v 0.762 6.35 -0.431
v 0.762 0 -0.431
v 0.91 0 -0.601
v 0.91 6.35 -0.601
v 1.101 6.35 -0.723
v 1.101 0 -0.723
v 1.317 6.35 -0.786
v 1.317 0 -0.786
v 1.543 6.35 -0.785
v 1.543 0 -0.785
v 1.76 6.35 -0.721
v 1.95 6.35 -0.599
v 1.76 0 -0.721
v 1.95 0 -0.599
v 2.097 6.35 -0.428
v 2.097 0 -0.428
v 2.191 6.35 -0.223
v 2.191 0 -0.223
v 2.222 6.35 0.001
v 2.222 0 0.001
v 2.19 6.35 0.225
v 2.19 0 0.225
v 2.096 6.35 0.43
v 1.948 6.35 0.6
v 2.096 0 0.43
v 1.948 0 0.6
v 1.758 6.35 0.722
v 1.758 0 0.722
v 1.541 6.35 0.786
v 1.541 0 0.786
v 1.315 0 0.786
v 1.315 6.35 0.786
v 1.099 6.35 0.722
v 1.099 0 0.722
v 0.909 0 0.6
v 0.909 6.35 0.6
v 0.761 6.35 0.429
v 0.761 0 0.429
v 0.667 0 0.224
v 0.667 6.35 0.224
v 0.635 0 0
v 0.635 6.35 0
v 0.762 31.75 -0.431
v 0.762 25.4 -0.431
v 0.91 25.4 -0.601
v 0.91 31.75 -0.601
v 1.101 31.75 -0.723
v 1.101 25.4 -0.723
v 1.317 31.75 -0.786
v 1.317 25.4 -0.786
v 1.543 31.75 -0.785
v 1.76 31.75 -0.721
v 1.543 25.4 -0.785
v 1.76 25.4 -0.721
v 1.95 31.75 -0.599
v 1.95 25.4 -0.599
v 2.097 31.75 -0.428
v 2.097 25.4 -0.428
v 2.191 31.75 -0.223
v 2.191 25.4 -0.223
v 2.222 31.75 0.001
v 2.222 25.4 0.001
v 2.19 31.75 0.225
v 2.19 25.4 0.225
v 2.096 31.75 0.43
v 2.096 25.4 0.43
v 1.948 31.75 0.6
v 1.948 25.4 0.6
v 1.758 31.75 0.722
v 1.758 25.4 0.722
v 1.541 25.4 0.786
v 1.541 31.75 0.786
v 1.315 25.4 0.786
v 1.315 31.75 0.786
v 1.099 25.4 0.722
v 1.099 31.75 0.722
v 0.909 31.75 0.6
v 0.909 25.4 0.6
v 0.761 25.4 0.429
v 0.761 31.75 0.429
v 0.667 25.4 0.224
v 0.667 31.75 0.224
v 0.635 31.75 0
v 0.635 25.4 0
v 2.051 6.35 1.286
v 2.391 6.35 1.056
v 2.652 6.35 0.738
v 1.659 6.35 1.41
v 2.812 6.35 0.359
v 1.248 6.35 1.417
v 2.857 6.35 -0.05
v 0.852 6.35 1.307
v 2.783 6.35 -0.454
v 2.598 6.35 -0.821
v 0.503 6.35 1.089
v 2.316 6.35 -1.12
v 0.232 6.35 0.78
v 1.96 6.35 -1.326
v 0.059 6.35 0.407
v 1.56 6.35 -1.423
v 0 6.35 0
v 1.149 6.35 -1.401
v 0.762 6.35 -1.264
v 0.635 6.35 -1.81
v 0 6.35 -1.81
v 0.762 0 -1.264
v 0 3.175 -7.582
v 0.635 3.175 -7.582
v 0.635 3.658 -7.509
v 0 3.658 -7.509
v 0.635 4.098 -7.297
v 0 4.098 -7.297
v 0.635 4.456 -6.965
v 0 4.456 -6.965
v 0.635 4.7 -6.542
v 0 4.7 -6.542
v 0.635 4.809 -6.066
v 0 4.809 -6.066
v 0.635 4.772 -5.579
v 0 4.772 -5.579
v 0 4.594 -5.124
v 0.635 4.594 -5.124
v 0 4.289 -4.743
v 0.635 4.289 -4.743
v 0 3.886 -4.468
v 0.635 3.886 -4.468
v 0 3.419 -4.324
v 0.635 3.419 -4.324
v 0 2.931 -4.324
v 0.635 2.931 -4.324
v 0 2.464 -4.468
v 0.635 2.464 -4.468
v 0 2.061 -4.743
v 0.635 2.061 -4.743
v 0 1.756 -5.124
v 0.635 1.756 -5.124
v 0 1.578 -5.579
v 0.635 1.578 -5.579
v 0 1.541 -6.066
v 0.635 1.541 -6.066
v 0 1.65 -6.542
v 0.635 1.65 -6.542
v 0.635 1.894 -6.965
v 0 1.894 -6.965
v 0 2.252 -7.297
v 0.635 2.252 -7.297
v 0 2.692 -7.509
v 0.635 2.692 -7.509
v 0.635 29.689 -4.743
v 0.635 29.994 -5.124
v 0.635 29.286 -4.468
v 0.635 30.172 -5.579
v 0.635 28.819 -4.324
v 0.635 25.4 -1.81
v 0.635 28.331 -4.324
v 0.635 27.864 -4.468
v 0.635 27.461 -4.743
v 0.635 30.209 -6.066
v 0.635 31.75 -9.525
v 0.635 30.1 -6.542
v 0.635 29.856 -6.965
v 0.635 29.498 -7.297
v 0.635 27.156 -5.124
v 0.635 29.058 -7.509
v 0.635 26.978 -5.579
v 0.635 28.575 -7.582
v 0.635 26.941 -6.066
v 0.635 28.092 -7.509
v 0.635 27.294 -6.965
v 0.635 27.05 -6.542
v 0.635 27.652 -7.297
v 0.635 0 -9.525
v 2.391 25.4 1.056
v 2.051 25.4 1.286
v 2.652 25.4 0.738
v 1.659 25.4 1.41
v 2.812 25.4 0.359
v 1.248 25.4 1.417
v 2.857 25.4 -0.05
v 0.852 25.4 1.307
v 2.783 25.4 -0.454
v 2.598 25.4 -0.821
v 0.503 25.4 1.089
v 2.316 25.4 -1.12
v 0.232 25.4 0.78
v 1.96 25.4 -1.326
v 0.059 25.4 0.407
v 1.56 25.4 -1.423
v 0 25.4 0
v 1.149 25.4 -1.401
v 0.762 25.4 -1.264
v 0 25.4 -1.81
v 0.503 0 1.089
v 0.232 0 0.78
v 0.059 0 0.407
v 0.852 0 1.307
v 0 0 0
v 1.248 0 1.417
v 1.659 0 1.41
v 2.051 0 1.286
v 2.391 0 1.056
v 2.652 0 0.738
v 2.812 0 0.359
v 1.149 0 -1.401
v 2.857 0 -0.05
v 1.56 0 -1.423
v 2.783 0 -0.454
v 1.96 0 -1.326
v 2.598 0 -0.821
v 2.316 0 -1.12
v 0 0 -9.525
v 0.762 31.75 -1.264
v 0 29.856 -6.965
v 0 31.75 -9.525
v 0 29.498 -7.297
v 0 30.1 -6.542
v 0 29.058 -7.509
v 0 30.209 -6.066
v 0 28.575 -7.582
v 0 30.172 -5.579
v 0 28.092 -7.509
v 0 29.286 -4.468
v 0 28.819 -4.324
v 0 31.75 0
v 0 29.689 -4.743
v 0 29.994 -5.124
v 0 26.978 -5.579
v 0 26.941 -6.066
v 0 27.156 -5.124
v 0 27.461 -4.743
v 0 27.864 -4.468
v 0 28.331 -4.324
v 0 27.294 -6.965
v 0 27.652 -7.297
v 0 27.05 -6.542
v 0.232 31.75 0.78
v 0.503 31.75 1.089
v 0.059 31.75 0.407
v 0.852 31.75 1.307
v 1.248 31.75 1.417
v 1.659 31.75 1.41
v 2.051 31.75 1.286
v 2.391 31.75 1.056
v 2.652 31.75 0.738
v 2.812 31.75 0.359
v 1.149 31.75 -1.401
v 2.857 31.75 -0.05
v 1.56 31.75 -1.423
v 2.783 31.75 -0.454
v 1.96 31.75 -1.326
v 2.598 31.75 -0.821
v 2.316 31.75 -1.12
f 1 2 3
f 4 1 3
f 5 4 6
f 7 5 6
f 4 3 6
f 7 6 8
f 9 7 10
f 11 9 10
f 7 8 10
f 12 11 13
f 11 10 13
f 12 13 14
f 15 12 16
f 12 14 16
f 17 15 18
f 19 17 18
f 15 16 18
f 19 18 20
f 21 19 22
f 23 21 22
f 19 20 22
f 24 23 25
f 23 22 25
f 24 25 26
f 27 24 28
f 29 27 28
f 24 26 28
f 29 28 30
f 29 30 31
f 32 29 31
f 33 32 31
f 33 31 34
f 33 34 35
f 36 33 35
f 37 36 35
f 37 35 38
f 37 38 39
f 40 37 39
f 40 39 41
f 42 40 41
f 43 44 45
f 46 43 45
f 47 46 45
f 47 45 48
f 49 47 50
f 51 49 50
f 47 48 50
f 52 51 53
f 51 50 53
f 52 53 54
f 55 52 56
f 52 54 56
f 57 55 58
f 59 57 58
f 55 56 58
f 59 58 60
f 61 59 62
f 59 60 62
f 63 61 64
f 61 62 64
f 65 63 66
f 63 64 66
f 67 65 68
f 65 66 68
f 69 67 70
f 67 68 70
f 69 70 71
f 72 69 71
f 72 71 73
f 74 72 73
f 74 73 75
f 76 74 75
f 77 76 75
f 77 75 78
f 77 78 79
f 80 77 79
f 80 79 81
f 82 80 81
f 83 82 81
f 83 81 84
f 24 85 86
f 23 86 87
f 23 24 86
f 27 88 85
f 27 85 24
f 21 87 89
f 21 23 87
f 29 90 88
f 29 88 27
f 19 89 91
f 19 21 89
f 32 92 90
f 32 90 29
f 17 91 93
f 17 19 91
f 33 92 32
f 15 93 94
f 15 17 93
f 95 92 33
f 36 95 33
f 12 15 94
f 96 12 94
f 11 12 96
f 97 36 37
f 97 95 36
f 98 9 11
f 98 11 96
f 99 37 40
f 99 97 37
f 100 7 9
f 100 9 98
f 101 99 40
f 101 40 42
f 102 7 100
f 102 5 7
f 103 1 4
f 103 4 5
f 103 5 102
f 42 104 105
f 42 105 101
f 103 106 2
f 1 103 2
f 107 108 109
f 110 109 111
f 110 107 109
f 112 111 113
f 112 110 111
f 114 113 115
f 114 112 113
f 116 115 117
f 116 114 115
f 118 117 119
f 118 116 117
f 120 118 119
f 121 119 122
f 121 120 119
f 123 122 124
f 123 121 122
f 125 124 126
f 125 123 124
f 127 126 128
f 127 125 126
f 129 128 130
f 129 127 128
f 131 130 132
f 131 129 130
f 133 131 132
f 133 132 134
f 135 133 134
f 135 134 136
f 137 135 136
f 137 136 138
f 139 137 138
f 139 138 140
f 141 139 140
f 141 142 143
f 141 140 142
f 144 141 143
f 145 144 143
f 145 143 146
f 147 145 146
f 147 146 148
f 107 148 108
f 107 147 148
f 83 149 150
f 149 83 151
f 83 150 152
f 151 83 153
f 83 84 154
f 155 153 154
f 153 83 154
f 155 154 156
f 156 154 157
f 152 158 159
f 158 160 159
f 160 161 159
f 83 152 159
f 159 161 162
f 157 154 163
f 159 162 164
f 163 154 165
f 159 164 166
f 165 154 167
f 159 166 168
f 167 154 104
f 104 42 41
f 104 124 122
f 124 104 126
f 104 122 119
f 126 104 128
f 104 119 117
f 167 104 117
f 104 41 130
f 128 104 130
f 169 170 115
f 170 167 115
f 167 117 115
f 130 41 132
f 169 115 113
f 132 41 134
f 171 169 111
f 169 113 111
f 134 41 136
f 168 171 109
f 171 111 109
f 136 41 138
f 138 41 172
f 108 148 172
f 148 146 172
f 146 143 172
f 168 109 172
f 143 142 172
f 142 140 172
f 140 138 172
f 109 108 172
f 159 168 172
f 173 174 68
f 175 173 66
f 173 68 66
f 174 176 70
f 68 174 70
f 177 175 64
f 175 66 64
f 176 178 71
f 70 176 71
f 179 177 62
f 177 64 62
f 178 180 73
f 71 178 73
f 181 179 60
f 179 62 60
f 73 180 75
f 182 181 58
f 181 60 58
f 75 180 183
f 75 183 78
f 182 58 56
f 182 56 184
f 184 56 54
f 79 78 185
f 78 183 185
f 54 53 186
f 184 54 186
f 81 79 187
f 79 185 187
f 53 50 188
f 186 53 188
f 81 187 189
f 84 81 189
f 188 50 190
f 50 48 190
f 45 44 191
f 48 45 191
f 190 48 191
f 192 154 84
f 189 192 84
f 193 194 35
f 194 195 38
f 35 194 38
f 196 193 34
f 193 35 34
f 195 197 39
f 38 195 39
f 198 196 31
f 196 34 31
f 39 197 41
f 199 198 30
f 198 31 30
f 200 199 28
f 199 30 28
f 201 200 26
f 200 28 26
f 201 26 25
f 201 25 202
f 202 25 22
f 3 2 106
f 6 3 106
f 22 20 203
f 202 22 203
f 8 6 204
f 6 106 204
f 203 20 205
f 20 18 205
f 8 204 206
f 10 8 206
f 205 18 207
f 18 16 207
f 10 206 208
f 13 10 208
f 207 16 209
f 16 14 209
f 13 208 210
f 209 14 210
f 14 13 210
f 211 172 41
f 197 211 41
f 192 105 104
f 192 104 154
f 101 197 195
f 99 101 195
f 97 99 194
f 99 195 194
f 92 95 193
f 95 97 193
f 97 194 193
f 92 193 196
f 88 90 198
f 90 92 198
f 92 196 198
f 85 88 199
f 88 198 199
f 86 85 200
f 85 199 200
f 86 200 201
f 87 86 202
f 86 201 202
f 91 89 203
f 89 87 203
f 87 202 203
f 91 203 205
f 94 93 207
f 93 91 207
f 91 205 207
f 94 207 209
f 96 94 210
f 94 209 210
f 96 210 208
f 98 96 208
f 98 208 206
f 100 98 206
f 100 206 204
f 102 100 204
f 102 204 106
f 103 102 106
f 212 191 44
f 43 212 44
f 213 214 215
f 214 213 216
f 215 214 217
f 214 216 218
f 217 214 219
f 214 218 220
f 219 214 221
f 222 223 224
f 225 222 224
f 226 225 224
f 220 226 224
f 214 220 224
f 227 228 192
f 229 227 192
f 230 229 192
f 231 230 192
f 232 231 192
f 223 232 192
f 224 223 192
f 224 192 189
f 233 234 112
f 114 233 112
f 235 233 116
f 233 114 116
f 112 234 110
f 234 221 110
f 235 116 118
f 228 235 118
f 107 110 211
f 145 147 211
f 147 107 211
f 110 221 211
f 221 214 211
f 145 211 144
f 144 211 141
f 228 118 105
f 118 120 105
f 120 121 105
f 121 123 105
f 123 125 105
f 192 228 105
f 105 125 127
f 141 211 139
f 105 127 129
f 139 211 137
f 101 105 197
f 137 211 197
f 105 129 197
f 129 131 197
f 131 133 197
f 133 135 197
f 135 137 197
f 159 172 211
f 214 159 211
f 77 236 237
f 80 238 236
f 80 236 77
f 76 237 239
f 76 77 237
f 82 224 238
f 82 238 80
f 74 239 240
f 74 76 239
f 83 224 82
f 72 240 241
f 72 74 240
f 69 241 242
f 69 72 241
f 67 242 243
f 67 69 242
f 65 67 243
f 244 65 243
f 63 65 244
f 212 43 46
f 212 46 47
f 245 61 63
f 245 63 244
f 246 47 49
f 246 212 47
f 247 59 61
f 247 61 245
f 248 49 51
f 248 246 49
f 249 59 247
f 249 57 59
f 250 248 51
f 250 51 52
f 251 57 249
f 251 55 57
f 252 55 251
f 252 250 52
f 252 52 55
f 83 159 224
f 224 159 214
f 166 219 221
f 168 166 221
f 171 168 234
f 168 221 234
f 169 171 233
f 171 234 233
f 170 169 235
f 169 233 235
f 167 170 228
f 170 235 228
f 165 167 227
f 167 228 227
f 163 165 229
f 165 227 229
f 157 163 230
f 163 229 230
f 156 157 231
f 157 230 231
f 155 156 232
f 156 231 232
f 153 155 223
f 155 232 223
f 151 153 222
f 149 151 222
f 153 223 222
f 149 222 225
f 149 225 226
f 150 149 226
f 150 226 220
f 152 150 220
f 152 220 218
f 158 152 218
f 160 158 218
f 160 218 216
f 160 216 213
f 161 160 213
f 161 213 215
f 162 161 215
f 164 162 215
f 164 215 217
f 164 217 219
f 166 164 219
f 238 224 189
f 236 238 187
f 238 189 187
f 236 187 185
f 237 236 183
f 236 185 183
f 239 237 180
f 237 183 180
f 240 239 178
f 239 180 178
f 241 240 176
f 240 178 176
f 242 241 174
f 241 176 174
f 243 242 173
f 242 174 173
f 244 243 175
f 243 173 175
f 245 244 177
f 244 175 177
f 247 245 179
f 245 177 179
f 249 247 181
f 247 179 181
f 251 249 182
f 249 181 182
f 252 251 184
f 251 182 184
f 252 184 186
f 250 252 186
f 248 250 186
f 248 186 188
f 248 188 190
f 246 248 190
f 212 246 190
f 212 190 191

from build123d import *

# Parameters (mm, degrees)
BOSS_EXTRUDE1_DEPTH = 31.75
SKETCH7_W           = 3.6195
SKETCH7_H           = 6.35
CUT_EXTRUDE2_DEPTH  = 3.8575
SKETCH10_W          = 3.6195
SKETCH10_H          = 6.35
CUT_EXTRUDE4_DEPTH  = 3.8575
SKETCH15_R          = 1.6383
CUT_EXTRUDE5_DEPTH  = 3.8575


with BuildPart() as part:
    # Sketch3 → Boss-Extrude1 (new body)
    with BuildSketch(Plane(origin=(0, 0, 0), x_dir=(1, 0, 0), z_dir=(0, 1, 0))):
        with BuildLine():
            Line((0.635, 9.525), (0, 9.525))
            Line((0, 9.525), (0, 0))
            ThreePointArc((0, 0), (2.652258403, -0.737803327), (0.762, 1.263634045))
            Line((0.762, 1.263634045), (0.762, 0.430677954))
            ThreePointArc((0.762, 0.430677954), (2.190088254, -0.224506403), (0.635, 0))
            Line((0.635, 0), (0.635, 9.525))
        make_face()
    extrude(amount=BOSS_EXTRUDE1_DEPTH)

    # Sketch7 → Cut-Extrude2 (cut, through all)
    with BuildSketch(Plane(origin=(0, 0, 0), x_dir=(0, 0, -1), z_dir=(1, 0, 0))):
        with Locations((0, 34.925)):
            Rectangle(SKETCH7_W, SKETCH7_H)
        with Locations((0, 9.525)):
            Rectangle(SKETCH7_W, SKETCH7_H)
        with Locations((0, 22.225)):
            Rectangle(SKETCH7_W, SKETCH7_H)
    extrude(amount=CUT_EXTRUDE2_DEPTH, mode=Mode.SUBTRACT)

    # Sketch10 → Cut-Extrude4 (cut, through all)
    with BuildSketch(Plane(origin=(0, 0, 0), x_dir=(0, 0, -1), z_dir=(1, 0, 0))):
        with Locations((0, 15.875)):
            Rectangle(SKETCH10_W, SKETCH10_H)
    extrude(amount=CUT_EXTRUDE4_DEPTH, mode=Mode.SUBTRACT)

    # Sketch15 → Cut-Extrude5 (cut, through all)
    with BuildSketch(Plane(origin=(0, 0, 0), x_dir=(0, 0, -1), z_dir=(1, 0, 0))):
        with Locations((5.9436, 3.175)):
            Circle(SKETCH15_R)
    cut_extrude5 = extrude(amount=CUT_EXTRUDE5_DEPTH, mode=Mode.SUBTRACT)

    # Mirror1: Cut-Extrude5 across plane
    add(cut_extrude5.mirror(Plane(origin=(0, 15.875, 0), x_dir=(0, 0, 1), z_dir=(0, -1, 0))), mode=Mode.SUBTRACT)


solid = part.part
